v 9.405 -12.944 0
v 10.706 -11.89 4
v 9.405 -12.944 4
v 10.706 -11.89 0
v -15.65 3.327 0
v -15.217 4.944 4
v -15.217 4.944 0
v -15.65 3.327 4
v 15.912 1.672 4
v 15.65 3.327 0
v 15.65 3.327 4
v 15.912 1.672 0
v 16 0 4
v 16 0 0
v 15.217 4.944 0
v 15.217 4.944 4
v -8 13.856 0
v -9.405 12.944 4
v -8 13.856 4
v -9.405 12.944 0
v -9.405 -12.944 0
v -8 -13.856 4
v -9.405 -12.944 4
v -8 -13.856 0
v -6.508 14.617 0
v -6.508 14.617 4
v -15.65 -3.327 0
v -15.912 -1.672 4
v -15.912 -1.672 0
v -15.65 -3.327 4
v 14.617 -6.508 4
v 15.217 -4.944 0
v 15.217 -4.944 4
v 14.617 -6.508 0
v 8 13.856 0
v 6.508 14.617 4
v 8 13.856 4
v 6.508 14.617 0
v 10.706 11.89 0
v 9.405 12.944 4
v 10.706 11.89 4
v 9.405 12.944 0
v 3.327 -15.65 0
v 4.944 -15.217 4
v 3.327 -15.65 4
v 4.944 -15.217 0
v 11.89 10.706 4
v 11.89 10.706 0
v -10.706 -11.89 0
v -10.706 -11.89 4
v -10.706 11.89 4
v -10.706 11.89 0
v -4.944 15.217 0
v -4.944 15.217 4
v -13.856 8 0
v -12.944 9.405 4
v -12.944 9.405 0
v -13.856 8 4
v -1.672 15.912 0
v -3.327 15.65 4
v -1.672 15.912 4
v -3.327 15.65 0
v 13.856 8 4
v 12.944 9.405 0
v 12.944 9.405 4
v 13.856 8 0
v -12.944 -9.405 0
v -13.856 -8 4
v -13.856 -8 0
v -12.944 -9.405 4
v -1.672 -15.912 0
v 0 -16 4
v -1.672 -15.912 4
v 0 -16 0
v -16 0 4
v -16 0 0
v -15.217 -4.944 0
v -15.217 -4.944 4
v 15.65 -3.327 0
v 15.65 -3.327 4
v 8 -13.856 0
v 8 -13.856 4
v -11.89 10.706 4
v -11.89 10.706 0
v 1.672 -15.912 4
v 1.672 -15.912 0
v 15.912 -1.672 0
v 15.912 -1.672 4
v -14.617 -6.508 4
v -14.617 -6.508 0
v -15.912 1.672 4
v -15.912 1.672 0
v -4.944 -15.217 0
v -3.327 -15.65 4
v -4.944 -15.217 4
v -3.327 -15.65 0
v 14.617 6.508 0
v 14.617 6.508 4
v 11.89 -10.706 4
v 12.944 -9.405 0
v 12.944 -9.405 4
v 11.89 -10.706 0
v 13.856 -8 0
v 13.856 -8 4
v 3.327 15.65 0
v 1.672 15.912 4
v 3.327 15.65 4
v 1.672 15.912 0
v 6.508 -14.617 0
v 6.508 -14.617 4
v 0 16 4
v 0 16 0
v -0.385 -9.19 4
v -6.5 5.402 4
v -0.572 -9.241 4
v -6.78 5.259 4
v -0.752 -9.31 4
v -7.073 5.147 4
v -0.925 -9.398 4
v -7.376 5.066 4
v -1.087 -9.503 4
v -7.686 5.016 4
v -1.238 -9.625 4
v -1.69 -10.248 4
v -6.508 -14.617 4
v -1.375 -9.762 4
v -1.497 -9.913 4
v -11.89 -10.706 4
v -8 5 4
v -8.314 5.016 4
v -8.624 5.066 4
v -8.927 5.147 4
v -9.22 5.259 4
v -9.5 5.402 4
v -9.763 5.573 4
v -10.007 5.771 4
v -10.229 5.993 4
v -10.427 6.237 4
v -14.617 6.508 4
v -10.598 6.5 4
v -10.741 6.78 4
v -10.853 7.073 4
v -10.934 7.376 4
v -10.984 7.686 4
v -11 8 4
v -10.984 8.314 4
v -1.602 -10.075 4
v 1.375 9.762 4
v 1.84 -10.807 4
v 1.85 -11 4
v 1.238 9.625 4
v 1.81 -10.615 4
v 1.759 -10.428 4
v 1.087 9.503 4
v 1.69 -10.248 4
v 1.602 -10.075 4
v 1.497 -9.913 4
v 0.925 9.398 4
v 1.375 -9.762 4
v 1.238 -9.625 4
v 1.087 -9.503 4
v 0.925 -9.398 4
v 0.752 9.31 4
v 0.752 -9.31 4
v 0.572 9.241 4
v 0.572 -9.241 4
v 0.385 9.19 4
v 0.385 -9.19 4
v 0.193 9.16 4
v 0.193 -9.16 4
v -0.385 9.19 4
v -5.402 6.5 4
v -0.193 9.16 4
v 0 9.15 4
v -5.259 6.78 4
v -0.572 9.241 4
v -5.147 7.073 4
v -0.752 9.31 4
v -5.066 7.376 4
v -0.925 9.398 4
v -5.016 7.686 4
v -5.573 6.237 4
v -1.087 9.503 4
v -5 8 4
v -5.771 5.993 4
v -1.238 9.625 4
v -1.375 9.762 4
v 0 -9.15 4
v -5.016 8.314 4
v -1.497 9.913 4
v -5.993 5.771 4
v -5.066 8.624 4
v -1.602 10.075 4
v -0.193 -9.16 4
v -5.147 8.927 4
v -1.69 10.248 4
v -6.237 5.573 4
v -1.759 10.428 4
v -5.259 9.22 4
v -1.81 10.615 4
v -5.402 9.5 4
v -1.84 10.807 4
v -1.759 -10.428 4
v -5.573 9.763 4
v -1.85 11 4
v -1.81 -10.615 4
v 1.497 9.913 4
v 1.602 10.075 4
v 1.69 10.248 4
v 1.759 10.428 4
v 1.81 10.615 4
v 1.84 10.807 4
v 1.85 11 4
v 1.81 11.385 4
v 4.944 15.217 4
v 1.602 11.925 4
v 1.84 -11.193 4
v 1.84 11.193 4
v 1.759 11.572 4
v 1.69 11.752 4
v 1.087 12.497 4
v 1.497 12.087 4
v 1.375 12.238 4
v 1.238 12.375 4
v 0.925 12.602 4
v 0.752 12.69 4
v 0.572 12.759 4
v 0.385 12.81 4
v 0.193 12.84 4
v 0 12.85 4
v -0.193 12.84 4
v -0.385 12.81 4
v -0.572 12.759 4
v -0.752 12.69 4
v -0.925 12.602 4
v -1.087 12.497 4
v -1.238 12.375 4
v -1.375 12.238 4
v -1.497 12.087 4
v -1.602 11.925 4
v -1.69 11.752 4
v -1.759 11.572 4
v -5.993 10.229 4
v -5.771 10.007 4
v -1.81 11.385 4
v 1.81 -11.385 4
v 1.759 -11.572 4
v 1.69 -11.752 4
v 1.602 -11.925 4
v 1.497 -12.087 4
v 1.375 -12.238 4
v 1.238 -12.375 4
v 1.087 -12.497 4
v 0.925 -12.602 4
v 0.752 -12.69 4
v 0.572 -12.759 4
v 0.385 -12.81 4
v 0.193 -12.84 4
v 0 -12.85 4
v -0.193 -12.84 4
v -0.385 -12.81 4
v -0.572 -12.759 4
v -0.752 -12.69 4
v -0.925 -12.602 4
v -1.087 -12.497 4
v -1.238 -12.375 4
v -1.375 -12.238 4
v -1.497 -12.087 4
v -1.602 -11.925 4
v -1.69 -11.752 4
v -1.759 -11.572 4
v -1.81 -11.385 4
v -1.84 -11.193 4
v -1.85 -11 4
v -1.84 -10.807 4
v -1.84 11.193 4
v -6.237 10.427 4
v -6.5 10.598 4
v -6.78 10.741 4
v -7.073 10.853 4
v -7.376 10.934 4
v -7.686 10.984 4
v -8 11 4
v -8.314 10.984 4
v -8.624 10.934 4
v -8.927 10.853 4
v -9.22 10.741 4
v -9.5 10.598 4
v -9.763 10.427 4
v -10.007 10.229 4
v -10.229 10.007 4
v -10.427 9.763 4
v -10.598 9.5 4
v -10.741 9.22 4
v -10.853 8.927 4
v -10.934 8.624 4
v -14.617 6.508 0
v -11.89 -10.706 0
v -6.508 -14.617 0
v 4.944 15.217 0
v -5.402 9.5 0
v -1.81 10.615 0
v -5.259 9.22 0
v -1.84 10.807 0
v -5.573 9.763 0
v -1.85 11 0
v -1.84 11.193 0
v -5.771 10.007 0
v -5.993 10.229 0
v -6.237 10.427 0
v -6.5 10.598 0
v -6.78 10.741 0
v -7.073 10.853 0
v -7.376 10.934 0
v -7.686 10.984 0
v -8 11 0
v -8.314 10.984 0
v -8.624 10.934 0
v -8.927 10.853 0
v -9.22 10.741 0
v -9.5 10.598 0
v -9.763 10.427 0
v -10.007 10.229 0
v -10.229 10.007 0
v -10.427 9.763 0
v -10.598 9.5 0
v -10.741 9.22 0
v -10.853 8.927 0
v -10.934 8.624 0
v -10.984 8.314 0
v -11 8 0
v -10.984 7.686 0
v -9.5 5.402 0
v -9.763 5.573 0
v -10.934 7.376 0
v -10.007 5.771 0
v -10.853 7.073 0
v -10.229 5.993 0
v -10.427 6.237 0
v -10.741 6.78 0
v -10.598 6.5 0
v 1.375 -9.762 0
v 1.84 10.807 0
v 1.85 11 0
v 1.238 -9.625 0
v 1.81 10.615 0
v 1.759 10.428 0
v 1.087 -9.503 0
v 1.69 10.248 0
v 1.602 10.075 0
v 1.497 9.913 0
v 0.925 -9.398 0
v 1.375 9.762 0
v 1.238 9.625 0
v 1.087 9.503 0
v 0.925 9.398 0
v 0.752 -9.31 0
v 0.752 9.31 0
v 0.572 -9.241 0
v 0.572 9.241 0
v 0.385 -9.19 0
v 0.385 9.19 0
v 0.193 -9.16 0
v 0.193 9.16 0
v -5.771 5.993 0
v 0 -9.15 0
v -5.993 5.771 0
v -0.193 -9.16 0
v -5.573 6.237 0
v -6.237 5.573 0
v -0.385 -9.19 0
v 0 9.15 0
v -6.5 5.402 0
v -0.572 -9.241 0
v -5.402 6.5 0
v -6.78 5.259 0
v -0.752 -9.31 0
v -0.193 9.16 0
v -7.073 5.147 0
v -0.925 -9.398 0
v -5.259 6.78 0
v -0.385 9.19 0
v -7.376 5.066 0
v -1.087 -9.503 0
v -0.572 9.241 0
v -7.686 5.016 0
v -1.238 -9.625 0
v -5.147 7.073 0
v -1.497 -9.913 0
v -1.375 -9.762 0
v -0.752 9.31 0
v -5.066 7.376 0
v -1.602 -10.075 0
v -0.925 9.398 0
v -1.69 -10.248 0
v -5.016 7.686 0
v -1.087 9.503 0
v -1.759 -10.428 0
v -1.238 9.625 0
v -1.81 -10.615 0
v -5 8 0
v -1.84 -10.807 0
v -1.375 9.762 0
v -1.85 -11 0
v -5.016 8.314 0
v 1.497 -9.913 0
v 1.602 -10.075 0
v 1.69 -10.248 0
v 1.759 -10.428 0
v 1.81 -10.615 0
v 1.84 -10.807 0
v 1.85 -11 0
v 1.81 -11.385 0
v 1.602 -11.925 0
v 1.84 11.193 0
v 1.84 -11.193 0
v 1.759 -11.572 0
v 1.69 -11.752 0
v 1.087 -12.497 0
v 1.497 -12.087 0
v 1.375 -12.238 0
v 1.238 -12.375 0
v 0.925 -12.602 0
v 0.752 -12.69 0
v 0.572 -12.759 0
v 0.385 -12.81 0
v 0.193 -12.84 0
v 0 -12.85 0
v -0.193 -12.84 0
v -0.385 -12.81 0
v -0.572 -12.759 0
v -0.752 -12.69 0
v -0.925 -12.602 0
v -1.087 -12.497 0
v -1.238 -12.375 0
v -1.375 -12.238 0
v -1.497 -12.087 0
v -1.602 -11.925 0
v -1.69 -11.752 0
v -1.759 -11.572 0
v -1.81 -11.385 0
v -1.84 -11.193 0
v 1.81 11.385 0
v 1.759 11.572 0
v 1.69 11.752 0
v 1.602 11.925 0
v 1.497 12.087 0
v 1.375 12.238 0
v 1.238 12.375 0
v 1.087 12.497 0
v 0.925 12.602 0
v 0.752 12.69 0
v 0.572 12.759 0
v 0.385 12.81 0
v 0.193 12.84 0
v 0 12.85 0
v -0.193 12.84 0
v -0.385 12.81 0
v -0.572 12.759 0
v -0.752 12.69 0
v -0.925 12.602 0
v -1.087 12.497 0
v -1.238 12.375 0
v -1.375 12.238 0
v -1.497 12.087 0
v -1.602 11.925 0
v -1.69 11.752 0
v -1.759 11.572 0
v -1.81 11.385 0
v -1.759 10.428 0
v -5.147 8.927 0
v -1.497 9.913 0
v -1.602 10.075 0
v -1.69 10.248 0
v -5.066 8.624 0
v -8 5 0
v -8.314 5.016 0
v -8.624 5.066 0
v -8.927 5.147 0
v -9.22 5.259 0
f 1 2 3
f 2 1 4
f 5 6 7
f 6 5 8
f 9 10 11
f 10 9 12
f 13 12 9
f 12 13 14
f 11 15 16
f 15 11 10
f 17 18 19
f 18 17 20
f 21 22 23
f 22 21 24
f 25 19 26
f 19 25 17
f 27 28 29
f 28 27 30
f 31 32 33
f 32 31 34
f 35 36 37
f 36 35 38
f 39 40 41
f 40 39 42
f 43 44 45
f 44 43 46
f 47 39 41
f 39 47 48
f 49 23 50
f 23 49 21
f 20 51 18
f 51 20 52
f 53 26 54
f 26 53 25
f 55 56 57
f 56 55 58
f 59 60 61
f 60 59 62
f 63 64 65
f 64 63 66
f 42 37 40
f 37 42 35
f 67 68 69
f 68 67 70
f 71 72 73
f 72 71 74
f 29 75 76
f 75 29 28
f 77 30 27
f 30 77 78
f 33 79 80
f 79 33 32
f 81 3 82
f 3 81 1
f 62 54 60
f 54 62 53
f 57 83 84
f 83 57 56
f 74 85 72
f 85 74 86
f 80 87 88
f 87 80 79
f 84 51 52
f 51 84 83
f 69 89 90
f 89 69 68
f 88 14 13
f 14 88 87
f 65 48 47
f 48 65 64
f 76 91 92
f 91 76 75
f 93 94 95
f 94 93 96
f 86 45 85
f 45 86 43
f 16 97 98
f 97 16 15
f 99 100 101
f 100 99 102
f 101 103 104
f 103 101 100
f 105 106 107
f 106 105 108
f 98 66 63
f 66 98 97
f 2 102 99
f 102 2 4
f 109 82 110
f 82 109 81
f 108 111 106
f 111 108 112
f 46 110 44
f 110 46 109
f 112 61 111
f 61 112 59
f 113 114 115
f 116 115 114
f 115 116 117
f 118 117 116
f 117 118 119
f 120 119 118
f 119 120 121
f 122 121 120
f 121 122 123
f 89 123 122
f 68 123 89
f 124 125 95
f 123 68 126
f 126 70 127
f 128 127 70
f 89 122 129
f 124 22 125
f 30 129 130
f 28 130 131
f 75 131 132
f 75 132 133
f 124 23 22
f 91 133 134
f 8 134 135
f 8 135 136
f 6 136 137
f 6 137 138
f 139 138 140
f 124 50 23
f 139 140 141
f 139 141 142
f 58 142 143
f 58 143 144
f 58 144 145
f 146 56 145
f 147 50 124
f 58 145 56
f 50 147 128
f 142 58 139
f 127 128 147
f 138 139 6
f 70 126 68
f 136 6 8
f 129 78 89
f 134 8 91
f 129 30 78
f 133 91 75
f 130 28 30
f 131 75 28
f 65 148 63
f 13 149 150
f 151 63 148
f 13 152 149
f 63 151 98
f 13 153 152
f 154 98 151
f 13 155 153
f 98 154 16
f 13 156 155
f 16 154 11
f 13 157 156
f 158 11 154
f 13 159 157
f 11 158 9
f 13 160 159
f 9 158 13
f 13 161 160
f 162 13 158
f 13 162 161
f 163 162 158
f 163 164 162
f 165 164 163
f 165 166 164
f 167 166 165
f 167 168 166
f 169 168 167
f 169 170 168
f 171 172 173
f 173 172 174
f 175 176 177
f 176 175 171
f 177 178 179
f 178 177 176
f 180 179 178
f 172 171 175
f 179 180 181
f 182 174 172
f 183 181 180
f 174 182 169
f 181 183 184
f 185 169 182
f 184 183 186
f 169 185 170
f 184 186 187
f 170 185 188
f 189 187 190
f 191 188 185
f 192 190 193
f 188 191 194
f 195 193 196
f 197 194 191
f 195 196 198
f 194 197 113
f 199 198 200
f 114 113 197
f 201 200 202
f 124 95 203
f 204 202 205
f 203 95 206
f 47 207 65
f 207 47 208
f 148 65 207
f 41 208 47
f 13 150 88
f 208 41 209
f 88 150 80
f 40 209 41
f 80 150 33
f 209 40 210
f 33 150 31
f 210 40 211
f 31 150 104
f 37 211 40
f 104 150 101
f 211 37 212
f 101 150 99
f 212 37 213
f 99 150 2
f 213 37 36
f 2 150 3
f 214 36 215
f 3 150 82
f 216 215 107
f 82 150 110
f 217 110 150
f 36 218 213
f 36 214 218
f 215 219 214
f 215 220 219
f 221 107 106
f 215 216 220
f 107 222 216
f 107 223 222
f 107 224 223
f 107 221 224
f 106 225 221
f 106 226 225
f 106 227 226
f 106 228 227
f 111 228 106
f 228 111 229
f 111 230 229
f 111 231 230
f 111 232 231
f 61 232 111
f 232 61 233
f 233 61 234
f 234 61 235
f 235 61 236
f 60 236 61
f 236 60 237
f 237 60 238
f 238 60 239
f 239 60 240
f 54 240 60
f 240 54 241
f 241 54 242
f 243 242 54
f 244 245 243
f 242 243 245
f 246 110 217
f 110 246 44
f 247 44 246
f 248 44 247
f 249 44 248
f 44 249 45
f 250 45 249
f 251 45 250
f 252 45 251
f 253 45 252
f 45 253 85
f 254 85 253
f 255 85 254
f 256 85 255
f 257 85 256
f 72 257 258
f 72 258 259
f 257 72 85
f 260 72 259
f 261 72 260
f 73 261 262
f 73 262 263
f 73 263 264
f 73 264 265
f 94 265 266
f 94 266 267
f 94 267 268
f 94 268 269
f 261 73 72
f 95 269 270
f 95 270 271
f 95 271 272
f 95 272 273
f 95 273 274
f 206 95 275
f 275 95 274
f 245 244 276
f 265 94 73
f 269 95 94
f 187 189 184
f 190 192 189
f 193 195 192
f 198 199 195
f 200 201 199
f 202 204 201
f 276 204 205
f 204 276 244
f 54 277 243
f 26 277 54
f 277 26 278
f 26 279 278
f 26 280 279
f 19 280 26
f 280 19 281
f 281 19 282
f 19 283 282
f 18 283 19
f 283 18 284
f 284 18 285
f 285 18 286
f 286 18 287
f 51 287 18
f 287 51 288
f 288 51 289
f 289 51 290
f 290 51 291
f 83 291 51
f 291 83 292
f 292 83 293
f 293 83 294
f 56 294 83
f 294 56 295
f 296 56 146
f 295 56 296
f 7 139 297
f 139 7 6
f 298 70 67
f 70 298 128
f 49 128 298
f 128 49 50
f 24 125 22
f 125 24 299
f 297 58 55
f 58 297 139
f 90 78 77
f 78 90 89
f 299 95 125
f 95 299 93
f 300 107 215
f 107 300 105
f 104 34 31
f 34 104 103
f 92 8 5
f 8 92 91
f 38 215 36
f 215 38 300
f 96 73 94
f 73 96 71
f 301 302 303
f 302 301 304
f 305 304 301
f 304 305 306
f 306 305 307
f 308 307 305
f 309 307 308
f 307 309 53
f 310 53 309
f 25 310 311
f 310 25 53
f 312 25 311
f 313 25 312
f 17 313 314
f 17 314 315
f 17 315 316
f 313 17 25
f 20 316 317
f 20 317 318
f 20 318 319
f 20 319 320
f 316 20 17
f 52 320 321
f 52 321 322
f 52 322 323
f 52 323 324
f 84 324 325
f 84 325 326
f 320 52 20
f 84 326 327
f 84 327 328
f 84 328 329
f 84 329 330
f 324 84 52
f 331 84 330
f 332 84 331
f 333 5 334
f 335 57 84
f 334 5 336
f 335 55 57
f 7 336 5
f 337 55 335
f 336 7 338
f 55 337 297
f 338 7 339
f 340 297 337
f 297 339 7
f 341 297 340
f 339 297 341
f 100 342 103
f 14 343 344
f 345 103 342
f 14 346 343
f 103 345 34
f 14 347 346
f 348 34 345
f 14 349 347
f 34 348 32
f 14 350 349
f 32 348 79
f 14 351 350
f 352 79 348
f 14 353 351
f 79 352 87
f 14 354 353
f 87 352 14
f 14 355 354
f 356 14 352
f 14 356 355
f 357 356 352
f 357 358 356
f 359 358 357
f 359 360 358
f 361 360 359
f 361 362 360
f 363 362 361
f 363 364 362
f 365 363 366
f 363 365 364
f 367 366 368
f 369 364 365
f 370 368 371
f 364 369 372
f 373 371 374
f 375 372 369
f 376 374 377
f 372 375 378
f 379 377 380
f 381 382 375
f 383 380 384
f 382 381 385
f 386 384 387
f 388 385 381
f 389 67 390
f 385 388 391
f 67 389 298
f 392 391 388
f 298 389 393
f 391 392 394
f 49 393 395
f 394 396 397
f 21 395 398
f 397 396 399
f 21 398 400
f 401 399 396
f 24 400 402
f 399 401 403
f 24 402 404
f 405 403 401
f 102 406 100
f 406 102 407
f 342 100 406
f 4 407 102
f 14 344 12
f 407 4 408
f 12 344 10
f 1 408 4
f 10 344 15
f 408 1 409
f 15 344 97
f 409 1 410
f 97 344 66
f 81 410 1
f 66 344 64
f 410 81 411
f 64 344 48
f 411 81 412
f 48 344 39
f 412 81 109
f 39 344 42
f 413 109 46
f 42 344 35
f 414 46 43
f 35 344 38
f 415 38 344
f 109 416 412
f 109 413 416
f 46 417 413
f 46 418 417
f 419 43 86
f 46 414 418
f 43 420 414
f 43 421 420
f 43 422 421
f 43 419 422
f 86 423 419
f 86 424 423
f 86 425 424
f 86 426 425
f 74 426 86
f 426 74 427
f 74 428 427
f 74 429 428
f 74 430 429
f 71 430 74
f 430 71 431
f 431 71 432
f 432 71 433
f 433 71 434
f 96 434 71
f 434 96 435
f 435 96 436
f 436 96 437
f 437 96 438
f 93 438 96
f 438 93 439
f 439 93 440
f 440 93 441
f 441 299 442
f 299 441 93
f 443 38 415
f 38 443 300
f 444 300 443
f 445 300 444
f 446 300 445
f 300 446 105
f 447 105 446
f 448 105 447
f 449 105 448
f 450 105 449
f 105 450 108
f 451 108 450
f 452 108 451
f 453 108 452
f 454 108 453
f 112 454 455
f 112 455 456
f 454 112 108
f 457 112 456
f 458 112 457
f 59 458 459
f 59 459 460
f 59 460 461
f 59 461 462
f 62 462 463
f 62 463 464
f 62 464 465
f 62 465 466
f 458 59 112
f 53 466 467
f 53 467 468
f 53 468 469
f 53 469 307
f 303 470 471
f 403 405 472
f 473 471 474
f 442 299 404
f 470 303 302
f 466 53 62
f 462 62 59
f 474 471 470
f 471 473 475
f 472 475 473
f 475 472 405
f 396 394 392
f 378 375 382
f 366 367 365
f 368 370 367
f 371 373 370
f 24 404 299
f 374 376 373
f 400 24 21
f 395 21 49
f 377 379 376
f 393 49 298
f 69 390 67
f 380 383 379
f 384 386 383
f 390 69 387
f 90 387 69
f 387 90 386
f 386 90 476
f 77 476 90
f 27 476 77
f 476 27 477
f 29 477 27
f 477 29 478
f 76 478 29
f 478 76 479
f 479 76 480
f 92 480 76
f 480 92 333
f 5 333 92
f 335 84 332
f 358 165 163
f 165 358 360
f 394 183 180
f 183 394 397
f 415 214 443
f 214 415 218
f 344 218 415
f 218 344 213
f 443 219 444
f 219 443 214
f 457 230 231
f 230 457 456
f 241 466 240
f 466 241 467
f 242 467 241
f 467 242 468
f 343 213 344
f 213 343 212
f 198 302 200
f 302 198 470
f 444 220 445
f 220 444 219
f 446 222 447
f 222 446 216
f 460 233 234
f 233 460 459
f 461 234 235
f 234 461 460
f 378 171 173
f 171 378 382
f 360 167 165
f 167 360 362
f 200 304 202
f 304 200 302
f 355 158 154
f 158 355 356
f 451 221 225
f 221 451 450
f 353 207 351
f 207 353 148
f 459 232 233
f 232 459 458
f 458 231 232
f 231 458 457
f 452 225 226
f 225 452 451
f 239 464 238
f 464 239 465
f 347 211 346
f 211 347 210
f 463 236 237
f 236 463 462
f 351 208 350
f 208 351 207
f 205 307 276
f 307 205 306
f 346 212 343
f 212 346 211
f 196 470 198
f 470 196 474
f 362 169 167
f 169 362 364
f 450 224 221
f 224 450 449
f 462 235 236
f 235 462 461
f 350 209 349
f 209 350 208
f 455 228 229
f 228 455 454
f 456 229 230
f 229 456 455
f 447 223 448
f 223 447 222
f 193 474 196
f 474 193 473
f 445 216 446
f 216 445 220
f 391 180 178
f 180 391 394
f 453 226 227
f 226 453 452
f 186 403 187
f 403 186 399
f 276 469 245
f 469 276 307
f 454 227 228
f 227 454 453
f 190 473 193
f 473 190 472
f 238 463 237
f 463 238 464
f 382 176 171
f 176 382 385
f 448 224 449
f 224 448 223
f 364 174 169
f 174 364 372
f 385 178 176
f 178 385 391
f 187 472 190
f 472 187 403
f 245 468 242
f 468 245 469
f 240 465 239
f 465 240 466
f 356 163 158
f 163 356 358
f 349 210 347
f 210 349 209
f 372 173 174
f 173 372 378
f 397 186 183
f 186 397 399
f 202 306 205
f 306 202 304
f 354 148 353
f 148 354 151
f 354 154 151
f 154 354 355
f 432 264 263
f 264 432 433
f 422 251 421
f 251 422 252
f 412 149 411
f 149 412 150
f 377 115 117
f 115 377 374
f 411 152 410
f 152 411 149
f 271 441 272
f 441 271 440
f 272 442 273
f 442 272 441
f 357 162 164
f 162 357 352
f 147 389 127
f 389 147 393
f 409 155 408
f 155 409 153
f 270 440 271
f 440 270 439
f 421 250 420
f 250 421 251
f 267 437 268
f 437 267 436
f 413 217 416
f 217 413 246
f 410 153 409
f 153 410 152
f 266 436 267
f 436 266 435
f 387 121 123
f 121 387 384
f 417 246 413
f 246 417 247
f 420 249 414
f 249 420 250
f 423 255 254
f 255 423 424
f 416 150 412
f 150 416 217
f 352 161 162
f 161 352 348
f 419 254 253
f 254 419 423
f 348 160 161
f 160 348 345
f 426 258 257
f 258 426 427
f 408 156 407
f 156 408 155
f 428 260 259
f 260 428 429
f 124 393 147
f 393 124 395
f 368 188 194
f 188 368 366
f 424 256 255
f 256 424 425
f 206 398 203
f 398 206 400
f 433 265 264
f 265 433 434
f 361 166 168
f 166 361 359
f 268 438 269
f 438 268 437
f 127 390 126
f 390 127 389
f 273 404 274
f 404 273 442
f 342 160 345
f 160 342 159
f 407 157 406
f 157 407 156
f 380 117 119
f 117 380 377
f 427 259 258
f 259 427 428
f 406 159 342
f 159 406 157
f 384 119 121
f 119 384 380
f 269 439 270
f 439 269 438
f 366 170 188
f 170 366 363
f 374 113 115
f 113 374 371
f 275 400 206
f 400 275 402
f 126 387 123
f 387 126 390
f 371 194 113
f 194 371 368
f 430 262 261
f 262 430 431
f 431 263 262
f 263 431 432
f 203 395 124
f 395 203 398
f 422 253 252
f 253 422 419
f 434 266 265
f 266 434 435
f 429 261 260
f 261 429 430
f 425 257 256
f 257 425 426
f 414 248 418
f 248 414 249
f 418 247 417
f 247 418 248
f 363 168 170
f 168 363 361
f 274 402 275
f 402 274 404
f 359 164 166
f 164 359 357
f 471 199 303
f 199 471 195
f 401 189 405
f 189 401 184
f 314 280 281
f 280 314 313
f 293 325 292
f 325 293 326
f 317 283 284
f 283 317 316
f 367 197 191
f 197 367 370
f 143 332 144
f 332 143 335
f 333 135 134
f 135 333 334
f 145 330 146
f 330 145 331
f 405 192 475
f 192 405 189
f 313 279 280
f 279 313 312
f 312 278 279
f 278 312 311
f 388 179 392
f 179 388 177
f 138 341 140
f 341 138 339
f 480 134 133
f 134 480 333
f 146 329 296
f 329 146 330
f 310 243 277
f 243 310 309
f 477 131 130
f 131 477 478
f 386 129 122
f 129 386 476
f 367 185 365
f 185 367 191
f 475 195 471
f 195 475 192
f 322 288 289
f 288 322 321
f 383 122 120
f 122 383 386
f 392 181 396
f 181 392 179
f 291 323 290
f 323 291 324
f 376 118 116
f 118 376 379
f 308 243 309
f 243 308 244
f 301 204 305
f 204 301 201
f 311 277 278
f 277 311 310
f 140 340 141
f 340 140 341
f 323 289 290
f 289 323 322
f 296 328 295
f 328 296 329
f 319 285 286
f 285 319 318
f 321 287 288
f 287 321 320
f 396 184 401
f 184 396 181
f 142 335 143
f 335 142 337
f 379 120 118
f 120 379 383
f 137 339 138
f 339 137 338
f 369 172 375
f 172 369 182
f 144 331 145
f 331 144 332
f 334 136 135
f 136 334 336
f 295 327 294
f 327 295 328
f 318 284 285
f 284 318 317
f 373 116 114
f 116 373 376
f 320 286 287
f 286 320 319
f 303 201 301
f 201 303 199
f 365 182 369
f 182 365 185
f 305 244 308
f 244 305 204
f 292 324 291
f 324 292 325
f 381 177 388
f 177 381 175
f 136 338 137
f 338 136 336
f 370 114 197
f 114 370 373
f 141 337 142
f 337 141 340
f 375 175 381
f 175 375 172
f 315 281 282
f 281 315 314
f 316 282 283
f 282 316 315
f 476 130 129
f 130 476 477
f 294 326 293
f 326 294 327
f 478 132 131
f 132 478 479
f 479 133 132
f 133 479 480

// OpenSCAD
$fn = 60;
EPS = 0.01;
EPS2 = 2 * EPS;

H = 4;
OUTER = 32.0;

ROD_D = 3.5 + 0.2;
ROD_X = 0;
ROD_Y = 11;

CHANNEL_D = 5.8 + 0.2;
CHANNEL_X = -8.0;
CHANNEL_Y = 8.0;

difference() {
    cylinder(h=H, d=OUTER);
    translate([ROD_X, ROD_Y, -EPS]) cylinder(h=H + EPS2, d=ROD_D);
    translate([-ROD_X, -ROD_Y, -EPS]) cylinder(h=H + EPS2, d=ROD_D);
    translate([CHANNEL_X, CHANNEL_Y, -EPS]) cylinder(h=H + EPS2, d=CHANNEL_D);
}
